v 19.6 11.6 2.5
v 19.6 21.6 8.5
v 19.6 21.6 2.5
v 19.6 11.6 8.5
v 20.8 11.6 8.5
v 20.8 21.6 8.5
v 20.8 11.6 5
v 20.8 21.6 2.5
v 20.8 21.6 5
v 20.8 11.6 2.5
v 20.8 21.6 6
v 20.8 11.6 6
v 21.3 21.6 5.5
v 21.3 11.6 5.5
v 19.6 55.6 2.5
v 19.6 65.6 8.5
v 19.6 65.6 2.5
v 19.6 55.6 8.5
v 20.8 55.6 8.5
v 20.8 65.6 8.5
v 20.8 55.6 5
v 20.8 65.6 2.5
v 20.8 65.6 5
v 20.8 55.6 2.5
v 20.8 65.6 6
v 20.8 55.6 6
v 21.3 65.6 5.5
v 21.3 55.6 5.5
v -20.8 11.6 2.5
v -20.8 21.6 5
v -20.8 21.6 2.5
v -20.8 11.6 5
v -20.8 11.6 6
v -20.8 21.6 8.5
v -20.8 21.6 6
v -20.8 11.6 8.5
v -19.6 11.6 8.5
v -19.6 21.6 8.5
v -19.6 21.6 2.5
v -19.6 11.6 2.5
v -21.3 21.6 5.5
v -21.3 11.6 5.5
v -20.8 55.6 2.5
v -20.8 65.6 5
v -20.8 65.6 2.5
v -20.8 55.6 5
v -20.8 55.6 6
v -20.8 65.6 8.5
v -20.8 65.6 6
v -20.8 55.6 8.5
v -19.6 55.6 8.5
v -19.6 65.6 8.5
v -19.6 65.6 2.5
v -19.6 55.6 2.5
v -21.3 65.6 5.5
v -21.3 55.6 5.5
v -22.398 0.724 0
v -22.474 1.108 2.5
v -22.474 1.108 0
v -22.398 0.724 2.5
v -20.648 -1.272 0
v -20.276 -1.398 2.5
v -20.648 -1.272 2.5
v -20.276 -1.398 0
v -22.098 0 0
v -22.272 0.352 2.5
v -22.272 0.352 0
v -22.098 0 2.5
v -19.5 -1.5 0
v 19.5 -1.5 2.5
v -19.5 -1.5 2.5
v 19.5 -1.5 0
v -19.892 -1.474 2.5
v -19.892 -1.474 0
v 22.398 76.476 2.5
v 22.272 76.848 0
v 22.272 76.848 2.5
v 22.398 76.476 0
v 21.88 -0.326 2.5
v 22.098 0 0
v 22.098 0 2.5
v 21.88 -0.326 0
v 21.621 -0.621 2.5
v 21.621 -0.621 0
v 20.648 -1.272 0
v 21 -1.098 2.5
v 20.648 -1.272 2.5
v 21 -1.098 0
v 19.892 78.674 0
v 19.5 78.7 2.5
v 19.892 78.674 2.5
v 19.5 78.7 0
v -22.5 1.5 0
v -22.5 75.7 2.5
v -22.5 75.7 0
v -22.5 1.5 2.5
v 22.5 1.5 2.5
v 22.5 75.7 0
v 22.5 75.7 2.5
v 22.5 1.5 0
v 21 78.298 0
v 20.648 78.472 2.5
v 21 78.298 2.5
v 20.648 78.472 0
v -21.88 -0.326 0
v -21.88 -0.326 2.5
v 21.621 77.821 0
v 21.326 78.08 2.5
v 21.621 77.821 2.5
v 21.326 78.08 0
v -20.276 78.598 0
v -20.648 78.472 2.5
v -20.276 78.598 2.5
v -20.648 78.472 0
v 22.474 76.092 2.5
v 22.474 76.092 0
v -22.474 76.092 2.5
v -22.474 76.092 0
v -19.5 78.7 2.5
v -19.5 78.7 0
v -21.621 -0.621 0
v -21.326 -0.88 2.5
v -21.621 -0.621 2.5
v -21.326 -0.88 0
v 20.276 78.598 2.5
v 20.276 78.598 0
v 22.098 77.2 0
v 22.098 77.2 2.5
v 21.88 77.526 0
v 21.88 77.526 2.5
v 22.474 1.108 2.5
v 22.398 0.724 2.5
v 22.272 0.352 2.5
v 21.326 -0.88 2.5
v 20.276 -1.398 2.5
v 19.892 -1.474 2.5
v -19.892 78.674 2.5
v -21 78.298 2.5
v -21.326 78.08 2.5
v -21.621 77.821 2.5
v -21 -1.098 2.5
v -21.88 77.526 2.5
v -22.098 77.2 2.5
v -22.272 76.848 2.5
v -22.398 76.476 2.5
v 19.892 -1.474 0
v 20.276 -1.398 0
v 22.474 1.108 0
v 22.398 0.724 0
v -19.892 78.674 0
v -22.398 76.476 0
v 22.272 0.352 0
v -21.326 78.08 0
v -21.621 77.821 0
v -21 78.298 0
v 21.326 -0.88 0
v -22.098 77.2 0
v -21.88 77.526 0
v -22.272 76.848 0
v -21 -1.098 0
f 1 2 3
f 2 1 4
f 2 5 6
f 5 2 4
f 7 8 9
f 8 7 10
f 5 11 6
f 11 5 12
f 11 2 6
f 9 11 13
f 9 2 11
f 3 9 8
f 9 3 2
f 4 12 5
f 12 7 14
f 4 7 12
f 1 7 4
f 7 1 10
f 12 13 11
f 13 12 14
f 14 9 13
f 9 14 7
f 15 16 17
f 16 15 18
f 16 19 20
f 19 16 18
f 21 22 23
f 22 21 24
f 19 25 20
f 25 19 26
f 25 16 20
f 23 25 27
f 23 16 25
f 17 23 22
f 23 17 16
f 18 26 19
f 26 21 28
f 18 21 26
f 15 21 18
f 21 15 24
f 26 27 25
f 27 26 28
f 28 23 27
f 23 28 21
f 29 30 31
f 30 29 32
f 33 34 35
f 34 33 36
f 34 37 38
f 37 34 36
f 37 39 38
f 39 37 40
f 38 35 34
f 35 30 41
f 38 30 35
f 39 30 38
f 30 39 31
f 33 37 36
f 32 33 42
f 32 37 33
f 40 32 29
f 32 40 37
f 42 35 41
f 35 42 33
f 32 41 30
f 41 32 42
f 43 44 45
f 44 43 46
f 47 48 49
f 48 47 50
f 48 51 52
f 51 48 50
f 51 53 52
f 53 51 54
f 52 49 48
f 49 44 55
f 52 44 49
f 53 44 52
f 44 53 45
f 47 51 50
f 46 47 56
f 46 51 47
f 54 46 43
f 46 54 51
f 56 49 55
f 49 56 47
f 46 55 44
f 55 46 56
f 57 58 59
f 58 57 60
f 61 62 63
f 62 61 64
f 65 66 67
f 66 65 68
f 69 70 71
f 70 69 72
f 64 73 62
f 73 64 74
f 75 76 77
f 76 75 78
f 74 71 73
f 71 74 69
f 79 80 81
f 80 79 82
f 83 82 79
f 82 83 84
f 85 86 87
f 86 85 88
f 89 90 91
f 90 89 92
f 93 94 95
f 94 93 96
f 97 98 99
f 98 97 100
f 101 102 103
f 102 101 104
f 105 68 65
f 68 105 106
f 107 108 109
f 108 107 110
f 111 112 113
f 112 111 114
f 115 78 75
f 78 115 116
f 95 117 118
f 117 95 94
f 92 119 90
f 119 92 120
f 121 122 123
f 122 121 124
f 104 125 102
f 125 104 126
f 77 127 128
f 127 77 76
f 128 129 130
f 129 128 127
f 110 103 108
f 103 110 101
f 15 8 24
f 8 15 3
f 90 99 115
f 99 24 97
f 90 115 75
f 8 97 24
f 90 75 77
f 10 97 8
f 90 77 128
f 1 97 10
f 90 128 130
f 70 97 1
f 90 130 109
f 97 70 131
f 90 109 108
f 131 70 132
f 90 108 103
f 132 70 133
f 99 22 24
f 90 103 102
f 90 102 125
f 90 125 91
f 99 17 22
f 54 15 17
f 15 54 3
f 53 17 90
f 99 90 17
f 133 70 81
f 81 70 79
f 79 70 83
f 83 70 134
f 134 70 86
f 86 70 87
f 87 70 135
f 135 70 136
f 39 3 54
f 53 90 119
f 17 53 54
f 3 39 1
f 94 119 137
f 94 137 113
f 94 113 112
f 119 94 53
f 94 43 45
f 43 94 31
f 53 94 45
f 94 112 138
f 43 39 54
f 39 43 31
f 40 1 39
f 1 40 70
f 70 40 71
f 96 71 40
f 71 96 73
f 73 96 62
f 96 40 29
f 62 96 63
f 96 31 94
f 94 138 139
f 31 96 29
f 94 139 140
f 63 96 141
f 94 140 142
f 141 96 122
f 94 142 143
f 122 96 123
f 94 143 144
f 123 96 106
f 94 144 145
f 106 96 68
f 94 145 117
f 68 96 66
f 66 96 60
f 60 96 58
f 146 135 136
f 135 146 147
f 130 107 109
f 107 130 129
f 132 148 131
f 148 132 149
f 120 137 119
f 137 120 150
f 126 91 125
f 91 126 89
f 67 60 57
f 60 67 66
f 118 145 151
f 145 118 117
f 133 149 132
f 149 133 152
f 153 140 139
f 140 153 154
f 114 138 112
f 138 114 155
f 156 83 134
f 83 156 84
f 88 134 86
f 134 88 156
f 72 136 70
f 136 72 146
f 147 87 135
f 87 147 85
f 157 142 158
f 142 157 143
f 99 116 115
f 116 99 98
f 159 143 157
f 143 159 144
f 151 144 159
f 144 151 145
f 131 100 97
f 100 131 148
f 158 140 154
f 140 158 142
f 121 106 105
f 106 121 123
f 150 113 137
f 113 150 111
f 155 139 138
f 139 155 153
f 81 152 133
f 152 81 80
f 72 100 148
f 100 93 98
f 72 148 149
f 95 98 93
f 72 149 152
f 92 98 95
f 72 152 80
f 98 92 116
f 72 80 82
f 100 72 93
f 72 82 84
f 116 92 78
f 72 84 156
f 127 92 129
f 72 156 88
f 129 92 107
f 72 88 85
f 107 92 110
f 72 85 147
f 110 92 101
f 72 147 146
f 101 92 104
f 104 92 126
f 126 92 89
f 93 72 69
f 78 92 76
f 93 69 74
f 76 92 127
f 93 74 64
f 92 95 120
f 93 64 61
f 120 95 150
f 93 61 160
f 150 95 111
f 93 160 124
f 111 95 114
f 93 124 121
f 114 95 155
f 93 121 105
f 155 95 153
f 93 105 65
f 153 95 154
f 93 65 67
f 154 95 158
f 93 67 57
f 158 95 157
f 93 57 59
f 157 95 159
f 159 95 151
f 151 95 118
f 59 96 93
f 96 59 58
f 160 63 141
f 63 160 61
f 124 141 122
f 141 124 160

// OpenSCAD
// Back plate: built from model.scad as its own part.
include <model.scad>
view = "back";
